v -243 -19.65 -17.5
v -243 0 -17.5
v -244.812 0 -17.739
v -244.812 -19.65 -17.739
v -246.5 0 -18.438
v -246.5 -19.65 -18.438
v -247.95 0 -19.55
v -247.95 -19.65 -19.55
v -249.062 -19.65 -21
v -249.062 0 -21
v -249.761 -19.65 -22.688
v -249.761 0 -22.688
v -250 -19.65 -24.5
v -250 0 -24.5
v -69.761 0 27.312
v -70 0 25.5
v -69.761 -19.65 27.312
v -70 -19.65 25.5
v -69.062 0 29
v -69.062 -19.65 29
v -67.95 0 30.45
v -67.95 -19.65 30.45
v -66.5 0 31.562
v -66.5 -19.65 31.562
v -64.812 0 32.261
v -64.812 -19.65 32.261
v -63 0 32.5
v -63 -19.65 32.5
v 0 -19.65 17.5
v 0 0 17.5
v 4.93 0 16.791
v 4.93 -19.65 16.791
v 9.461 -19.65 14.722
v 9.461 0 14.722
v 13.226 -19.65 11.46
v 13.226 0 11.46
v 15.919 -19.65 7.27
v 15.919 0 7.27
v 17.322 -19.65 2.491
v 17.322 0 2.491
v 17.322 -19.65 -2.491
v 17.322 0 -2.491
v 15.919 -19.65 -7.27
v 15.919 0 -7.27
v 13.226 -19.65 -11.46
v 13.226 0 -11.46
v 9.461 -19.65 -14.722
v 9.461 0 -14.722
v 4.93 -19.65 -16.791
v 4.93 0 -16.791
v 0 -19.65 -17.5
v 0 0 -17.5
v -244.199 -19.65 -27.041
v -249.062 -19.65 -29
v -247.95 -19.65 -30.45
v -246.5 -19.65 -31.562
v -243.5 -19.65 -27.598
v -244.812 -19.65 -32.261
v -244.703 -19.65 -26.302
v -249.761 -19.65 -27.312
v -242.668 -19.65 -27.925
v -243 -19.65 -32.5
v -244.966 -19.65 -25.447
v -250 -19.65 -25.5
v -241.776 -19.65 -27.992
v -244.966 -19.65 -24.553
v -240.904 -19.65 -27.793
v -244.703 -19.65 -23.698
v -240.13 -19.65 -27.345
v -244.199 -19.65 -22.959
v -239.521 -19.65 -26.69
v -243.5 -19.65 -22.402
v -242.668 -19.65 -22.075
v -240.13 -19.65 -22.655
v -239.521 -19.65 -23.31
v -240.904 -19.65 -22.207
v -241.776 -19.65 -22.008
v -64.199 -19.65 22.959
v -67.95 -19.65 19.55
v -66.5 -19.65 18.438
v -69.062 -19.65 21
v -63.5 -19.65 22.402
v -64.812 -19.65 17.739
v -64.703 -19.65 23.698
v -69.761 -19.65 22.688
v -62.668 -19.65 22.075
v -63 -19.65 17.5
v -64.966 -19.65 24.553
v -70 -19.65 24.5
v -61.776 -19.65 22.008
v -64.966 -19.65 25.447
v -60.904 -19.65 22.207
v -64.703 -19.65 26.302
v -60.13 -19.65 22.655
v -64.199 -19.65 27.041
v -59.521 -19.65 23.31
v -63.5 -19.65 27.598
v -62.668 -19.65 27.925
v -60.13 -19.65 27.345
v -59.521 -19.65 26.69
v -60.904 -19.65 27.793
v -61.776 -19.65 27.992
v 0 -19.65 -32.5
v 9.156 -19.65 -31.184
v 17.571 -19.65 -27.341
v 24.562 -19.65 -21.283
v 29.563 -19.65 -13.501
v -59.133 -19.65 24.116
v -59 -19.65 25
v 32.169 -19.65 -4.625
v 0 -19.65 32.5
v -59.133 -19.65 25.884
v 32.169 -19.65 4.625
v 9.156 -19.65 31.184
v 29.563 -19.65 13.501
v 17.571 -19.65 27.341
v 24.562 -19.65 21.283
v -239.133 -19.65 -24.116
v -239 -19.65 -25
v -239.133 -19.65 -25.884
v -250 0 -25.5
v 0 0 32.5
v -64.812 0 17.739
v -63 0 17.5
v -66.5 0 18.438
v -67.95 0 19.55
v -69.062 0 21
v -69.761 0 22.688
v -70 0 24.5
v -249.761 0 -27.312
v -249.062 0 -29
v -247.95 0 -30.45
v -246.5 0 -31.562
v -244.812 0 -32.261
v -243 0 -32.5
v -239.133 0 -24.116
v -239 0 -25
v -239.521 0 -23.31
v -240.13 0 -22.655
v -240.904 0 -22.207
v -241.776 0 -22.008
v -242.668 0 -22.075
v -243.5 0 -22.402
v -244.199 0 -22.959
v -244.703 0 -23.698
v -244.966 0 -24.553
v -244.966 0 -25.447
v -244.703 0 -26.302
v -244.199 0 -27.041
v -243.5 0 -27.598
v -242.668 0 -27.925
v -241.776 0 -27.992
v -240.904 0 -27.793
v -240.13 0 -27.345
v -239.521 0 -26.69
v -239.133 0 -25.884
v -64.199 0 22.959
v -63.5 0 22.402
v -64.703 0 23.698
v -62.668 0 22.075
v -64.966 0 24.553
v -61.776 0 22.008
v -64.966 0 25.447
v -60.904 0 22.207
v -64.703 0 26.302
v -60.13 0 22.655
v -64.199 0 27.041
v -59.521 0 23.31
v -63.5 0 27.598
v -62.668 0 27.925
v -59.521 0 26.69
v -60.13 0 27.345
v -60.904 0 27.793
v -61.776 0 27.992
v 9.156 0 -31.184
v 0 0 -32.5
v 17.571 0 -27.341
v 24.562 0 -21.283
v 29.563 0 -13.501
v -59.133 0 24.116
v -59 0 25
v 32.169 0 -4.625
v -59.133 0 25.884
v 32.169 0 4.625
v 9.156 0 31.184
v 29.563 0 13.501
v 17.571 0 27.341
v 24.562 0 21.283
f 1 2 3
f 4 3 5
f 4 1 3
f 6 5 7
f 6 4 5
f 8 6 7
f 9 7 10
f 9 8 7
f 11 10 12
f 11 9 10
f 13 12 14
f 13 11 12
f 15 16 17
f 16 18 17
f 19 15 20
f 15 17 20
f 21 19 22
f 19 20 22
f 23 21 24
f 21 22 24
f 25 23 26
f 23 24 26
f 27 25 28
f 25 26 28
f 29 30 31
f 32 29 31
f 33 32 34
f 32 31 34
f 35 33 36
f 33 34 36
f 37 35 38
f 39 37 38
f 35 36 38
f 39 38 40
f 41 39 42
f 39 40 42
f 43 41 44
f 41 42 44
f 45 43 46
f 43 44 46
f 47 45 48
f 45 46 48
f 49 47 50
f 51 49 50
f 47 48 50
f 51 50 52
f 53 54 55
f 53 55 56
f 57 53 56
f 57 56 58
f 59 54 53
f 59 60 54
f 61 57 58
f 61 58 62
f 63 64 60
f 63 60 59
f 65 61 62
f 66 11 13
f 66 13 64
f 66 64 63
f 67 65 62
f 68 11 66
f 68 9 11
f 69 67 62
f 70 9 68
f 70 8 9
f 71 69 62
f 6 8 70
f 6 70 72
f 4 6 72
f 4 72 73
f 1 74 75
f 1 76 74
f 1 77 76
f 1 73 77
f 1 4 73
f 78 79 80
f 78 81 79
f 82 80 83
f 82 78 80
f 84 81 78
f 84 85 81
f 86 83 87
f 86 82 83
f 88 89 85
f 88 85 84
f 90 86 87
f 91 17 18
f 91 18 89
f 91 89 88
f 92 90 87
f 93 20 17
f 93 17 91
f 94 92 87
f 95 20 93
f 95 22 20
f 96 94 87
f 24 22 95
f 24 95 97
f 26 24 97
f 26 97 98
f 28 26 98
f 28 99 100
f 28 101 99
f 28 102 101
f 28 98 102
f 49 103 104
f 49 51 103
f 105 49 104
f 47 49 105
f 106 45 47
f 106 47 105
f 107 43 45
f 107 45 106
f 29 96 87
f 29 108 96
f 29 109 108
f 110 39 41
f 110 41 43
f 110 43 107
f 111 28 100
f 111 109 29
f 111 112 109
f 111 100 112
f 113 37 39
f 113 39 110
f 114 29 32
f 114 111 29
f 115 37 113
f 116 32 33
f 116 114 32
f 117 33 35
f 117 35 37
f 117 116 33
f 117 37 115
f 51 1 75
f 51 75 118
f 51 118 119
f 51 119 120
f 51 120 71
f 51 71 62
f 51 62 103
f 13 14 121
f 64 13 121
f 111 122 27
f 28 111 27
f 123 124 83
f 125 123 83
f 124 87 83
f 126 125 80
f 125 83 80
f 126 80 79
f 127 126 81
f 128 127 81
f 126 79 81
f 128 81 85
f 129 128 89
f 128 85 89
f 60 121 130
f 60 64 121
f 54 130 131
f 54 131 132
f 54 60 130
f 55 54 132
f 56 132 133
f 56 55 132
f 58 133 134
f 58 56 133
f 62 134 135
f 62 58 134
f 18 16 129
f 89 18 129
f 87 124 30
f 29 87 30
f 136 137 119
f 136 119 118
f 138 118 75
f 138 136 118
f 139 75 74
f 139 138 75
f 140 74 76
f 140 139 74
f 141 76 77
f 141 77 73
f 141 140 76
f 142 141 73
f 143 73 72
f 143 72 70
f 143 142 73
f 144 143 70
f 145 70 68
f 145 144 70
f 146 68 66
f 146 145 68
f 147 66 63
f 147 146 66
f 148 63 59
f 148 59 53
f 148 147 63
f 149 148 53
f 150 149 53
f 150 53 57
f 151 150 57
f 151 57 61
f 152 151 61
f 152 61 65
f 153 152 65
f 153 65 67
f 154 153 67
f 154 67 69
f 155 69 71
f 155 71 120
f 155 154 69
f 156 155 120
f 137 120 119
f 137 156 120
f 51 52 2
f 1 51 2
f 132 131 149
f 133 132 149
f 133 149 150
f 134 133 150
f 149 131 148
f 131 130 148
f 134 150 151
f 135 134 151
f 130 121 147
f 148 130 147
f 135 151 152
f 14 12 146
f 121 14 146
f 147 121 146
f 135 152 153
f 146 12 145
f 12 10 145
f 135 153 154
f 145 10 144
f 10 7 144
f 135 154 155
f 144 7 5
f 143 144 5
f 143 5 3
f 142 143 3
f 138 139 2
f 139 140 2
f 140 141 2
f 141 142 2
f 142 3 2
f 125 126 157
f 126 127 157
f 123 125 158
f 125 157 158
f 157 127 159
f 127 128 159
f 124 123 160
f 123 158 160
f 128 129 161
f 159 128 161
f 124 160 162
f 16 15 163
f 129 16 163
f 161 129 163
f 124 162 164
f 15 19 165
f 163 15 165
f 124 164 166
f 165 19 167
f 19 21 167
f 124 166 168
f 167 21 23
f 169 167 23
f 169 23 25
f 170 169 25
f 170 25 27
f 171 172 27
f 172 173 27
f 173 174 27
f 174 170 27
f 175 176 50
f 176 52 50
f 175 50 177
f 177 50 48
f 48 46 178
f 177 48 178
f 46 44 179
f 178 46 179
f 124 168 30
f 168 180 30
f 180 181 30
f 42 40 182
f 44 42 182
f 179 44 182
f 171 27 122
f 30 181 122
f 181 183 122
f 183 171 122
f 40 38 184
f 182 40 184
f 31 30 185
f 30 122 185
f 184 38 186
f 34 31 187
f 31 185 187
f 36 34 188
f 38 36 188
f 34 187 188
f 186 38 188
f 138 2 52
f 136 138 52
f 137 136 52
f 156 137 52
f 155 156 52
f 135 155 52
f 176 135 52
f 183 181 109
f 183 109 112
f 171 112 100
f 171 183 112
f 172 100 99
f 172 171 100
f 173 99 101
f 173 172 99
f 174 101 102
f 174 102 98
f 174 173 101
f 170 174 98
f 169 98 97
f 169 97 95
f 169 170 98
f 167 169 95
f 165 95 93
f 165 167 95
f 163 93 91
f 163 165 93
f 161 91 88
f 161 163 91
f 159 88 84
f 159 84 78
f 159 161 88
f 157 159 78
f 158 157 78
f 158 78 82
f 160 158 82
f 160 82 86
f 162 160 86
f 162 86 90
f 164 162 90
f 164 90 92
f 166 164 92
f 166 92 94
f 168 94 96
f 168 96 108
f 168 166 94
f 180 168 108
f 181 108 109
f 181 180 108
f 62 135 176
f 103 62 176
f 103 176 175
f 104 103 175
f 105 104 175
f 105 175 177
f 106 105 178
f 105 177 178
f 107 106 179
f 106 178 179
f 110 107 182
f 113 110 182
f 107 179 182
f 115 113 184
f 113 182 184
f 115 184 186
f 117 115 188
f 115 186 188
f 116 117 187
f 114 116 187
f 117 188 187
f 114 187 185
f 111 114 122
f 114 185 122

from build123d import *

# Parameters (mm, degrees)
F0_R     = 3
F1_DEPTH = 19.65
F2_R     = 7


with BuildPart() as f1:
    # F0 (on Front) → F1 (new body)
    with BuildSketch(Plane.XZ):
        with BuildLine():
            ThreePointArc((0, 17.5), (17.5, 0), (0, -17.5))
            Line((0, -17.5), (-250, -17.5))
            Line((-250, -17.5), (-250, -32.5))
            Line((-250, -32.5), (0, -32.5))
            ThreePointArc((0, -32.5), (32.5, 0), (0, 32.5))
            Line((0, 32.5), (-70, 32.5))
            Line((-70, 32.5), (-70, 17.5))
            Line((-70, 17.5), (0, 17.5))
        make_face()
        with Locations((-242, -25)):
            Circle(F0_R, mode=Mode.SUBTRACT)
        with Locations((-62, 25)):
            Circle(F0_R, mode=Mode.SUBTRACT)
    extrude(amount=F1_DEPTH)

    # F2
    f2_edges = [f1.edges().sort_by_distance(p)[0] for p in [
        (-250, -9.825, -17.5),
        (-250, -9.825, -32.5),
        (-70, -9.825, 17.5),
        (-70, -9.825, 32.5),
    ]]
    fillet(f2_edges, radius=F2_R)


solid = f1.part
